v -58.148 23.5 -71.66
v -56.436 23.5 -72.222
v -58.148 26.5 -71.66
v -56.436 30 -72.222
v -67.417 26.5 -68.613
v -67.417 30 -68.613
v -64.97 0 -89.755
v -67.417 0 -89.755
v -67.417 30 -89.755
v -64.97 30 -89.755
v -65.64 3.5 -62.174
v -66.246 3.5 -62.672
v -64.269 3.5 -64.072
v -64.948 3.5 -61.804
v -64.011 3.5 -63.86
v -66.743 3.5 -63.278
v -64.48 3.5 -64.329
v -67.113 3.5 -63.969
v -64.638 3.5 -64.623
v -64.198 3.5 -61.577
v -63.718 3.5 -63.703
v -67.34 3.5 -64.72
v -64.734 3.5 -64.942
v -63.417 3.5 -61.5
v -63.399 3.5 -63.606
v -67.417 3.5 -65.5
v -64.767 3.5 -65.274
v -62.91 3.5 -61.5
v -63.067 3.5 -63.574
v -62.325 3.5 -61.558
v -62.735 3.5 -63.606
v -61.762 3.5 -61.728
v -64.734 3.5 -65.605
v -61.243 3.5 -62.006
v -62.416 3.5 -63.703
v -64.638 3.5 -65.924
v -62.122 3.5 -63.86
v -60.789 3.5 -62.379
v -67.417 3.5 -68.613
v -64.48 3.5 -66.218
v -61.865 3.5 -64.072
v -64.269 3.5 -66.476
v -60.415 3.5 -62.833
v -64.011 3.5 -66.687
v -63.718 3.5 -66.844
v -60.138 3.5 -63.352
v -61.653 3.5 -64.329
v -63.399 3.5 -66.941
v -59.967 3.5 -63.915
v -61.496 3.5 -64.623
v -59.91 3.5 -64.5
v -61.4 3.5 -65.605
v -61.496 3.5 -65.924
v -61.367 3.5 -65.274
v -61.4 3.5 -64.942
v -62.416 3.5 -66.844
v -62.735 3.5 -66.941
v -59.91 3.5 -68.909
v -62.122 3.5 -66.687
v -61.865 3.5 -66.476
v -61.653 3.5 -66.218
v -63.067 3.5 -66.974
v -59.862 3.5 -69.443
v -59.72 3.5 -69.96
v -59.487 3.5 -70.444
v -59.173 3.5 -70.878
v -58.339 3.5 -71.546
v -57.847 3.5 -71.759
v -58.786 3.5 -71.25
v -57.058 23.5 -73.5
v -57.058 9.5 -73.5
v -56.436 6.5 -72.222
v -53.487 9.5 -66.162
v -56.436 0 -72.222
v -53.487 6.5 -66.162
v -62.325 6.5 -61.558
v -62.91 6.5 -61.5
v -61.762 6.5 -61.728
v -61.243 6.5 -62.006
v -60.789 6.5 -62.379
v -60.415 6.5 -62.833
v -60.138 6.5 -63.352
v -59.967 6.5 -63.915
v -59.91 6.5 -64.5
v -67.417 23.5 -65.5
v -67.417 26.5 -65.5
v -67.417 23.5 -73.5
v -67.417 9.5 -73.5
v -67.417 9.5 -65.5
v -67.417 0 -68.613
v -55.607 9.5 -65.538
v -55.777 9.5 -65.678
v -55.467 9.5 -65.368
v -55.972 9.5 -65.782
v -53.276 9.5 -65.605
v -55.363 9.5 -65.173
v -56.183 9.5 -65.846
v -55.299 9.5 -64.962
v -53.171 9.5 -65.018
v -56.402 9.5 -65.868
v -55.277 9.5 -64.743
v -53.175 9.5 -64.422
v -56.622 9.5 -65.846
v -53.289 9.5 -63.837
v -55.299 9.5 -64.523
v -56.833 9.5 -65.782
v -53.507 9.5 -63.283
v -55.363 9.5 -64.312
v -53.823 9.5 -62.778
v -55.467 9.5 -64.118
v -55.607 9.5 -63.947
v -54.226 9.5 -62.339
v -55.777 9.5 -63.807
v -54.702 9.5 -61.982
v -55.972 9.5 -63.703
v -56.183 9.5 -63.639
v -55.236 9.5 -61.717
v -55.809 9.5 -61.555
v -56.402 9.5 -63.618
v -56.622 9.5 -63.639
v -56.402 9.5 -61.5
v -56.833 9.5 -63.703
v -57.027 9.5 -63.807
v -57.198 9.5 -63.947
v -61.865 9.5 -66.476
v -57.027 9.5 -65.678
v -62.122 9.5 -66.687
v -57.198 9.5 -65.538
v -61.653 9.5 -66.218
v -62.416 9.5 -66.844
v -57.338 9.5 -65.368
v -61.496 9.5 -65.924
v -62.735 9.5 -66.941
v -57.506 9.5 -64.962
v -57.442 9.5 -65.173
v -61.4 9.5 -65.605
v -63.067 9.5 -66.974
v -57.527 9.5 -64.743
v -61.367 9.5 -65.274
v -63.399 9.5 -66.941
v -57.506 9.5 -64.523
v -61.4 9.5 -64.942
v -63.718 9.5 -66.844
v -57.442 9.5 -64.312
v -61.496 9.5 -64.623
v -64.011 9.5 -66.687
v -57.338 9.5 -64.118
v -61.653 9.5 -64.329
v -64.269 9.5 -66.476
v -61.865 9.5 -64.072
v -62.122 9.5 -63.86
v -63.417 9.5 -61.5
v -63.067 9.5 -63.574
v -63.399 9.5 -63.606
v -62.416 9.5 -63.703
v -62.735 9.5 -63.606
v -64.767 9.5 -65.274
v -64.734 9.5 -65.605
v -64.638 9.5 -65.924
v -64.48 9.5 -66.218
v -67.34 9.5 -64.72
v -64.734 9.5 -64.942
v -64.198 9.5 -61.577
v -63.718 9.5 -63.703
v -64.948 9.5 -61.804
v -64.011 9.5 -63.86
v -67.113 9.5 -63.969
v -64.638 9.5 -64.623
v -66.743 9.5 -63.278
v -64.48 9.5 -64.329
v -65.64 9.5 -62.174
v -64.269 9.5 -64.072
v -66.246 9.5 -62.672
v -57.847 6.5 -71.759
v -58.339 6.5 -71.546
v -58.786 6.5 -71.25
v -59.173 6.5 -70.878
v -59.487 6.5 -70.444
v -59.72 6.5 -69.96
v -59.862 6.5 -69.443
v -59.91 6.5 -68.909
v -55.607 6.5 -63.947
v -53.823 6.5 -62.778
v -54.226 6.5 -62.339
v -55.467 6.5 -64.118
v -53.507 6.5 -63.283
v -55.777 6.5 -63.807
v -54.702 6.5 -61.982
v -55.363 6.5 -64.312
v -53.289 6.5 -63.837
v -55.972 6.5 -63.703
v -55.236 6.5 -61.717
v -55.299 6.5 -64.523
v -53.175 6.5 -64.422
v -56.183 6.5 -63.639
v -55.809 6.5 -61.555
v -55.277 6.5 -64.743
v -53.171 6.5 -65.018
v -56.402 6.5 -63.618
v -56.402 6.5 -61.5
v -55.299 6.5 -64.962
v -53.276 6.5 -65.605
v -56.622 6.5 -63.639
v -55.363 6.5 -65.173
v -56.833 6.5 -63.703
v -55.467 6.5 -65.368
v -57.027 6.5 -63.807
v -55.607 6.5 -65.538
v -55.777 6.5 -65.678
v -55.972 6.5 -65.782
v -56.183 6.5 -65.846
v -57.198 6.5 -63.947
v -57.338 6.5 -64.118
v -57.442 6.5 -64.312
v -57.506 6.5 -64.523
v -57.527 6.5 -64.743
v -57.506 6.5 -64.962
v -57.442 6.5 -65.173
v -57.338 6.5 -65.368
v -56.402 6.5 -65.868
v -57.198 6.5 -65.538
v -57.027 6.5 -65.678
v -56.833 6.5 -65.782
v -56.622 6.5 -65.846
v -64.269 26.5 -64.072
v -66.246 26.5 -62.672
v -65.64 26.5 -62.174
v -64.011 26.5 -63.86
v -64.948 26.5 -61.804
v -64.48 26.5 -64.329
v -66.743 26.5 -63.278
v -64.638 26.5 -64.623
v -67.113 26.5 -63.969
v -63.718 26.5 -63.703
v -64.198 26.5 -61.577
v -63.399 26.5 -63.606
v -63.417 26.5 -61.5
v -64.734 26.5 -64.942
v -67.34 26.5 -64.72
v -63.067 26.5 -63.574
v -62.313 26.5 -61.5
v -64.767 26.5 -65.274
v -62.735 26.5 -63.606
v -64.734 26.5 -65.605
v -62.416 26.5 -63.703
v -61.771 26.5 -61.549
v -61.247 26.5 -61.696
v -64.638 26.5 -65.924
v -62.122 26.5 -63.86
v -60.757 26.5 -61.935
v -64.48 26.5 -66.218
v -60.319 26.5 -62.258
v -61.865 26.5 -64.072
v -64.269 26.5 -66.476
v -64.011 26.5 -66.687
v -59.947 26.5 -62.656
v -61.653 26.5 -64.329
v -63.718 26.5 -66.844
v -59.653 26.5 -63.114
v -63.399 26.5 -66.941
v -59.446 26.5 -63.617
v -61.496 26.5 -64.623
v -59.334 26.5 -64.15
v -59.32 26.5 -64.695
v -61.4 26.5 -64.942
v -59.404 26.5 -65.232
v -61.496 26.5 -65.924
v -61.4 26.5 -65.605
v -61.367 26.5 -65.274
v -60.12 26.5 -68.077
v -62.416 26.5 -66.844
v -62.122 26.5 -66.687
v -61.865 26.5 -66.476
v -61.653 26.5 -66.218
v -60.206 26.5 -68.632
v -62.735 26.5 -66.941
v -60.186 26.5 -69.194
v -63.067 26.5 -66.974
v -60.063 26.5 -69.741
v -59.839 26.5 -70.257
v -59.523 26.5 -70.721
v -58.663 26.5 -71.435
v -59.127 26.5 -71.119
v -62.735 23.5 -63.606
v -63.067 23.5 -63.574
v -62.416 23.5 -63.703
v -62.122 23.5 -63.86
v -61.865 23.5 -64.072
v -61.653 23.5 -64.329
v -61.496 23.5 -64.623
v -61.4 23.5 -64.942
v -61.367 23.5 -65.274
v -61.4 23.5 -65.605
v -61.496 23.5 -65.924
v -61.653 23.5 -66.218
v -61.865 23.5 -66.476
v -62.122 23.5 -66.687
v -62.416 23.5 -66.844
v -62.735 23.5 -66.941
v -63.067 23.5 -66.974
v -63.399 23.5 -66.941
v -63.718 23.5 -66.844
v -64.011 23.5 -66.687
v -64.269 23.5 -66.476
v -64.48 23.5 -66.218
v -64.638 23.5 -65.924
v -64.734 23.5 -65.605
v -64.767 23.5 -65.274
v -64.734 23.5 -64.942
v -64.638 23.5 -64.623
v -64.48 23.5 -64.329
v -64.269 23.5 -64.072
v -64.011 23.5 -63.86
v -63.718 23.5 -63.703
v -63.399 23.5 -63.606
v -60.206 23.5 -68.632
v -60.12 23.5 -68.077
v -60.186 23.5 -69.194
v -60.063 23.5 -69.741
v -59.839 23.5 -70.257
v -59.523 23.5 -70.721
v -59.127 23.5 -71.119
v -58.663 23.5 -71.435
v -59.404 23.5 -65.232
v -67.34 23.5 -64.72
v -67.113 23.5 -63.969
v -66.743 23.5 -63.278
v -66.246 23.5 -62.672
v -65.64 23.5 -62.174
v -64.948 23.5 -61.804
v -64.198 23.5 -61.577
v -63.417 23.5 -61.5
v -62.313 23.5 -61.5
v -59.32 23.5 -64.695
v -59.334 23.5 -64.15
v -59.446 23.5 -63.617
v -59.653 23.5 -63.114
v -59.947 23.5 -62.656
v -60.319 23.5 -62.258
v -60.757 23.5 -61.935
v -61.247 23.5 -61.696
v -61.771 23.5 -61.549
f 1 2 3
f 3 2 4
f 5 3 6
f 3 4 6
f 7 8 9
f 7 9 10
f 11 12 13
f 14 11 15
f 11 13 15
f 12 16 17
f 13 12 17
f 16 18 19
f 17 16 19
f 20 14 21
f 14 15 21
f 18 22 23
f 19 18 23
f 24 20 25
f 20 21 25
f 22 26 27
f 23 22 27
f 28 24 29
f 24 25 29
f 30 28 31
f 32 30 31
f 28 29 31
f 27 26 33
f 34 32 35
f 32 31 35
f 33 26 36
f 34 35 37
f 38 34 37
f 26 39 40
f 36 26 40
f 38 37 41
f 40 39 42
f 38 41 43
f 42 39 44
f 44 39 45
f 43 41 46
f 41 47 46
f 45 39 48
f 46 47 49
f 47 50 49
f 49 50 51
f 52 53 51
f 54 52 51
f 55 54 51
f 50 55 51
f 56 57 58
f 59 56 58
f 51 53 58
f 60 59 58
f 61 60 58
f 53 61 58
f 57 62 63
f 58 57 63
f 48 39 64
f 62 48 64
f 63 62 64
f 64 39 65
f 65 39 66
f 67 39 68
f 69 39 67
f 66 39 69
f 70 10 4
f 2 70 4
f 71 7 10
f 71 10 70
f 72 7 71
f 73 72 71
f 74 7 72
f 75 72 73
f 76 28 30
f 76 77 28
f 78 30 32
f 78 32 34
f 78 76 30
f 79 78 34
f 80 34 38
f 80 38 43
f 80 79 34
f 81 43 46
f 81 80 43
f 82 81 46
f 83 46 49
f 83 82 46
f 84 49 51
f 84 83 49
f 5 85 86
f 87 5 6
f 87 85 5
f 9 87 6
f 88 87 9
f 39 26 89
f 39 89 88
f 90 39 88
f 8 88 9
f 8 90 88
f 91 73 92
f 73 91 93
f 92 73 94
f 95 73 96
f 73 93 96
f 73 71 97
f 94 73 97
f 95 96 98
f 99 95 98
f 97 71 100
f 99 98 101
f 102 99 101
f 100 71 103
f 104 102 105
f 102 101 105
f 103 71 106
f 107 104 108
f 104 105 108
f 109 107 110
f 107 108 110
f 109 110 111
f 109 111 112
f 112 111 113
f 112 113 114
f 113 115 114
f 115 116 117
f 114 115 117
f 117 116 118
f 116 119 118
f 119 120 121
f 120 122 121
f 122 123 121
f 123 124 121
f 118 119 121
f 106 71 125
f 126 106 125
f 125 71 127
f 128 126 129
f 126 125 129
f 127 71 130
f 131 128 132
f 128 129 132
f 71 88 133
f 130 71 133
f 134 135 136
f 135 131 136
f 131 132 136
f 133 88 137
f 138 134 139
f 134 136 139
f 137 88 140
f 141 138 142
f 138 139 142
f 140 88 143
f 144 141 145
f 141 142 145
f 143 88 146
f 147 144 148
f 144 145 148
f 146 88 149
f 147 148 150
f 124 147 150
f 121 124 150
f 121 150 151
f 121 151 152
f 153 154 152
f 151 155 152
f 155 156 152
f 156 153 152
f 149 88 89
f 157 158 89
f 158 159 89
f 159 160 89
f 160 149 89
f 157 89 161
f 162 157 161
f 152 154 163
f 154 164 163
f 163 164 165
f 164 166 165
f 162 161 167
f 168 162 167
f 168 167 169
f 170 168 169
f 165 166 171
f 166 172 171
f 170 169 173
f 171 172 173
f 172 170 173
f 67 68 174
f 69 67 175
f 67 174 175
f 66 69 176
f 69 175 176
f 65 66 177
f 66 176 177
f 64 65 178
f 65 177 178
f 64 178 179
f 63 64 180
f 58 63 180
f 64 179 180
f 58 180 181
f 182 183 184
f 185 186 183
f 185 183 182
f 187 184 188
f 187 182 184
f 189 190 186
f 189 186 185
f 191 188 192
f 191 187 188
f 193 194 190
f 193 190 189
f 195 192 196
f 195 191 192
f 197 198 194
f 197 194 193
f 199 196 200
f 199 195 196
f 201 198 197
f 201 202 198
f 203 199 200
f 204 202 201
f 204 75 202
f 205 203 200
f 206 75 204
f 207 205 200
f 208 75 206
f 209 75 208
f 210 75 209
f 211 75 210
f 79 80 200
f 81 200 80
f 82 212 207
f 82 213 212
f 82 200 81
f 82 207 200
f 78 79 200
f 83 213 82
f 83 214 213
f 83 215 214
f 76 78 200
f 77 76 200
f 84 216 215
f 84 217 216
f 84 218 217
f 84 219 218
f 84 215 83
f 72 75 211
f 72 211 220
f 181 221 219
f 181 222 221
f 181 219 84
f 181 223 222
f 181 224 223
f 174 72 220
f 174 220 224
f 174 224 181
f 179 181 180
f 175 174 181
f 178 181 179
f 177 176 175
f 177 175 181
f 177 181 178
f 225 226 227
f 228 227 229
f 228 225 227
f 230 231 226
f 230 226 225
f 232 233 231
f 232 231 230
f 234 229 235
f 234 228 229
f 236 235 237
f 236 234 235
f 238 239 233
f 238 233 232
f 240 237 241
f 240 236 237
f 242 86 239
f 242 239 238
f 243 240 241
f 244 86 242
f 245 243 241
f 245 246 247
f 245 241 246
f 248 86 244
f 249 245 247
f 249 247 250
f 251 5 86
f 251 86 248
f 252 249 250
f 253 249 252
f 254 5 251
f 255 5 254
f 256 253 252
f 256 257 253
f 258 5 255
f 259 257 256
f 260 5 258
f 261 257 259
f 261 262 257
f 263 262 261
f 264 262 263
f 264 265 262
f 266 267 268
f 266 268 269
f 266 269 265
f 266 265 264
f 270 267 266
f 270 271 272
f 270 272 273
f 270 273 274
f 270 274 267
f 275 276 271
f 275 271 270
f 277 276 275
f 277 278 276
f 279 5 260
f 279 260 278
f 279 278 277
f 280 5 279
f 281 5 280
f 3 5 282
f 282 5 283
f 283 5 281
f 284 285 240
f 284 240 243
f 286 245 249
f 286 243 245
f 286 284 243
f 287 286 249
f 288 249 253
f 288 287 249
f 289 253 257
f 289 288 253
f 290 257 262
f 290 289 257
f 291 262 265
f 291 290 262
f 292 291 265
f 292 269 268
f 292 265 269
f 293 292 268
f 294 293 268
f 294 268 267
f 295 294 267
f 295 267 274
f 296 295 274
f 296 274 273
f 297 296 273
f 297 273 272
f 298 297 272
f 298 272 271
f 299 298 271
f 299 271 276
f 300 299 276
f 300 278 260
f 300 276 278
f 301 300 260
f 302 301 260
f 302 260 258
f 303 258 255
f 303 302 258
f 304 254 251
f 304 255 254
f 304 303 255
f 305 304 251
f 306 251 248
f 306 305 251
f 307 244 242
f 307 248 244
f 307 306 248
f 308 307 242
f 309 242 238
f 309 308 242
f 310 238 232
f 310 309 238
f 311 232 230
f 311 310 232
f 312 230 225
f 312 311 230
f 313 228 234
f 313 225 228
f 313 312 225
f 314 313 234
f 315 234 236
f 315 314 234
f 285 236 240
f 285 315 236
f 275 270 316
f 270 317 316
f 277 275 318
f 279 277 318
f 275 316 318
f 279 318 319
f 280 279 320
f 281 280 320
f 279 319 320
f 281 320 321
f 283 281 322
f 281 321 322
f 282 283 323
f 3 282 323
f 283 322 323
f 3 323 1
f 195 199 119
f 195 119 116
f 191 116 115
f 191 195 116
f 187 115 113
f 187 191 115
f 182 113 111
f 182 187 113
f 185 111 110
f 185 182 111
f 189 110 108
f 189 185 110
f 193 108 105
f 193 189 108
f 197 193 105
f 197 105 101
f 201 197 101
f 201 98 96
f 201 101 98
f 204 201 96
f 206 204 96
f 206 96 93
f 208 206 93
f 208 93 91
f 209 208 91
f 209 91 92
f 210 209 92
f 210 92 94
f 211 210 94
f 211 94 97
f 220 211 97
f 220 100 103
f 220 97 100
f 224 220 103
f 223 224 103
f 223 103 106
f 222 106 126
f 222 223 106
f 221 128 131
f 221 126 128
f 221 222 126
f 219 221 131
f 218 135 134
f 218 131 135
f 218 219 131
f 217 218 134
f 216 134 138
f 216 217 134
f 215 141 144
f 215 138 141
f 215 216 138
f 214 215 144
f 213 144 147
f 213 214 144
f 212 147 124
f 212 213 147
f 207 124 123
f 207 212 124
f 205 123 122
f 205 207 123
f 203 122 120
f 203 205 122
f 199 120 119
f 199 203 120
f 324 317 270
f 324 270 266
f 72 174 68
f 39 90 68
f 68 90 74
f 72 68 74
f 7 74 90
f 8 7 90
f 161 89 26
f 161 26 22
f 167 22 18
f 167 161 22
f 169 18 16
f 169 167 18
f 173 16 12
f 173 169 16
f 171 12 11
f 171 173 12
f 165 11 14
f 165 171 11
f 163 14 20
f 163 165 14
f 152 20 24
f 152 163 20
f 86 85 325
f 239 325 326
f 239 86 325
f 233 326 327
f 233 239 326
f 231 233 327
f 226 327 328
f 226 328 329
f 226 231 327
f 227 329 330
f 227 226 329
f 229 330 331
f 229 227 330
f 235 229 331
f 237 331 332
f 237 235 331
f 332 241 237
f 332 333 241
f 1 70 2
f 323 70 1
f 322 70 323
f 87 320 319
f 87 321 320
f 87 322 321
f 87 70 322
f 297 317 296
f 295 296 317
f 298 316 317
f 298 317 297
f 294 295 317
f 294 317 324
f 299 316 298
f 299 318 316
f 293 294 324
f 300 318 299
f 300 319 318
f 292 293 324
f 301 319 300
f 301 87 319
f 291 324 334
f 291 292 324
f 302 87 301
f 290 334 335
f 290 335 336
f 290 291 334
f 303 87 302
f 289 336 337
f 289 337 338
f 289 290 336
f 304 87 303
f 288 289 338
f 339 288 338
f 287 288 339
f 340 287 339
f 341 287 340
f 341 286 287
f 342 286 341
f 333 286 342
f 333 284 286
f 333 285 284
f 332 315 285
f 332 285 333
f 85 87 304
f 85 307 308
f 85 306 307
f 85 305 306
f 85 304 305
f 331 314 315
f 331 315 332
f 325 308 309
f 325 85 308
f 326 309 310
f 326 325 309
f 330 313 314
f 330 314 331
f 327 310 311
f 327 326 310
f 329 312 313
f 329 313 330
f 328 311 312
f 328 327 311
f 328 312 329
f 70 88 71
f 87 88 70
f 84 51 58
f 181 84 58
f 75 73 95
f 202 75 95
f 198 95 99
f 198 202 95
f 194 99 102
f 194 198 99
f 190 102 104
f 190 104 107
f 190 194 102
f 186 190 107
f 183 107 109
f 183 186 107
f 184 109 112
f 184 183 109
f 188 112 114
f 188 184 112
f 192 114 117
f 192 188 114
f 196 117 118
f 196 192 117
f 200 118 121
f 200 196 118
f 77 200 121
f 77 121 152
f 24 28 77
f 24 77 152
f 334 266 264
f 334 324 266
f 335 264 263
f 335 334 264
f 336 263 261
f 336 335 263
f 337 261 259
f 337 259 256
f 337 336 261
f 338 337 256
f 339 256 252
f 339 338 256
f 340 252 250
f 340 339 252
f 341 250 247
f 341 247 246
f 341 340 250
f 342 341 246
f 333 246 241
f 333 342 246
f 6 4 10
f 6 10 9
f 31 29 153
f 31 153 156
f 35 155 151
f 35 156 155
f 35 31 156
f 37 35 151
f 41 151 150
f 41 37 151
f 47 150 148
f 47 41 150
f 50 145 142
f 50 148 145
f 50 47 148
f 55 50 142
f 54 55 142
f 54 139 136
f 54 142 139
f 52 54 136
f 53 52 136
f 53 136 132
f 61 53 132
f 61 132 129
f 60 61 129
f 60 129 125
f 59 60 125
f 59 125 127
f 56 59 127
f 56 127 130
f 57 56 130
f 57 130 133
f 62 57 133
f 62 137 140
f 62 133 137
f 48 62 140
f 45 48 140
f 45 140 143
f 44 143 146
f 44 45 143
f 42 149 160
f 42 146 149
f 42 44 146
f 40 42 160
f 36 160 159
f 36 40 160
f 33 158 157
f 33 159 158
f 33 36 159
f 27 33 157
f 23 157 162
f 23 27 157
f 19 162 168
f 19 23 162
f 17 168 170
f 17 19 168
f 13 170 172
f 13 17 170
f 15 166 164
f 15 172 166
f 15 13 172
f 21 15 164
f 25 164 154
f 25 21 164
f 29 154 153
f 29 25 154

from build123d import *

# Parameters (mm, degrees)
SKETCH1_R           = 1.7000000000000015
SKETCH1_R_2         = 1.1249999999999982
BOSS_EXTRUDE1_DEPTH = 30
CUT_EXTRUDE1_DEPTH  = 3.5
CUT_EXTRUDE2_DEPTH  = 3.5
FILLET1_R           = 4
SKETCH6_W           = 16.8927871134671
SKETCH6_H           = 14
CUT_EXTRUDE3_DEPTH  = 96.70345562354154
CUT_EXTRUDE4_DEPTH  = 3
FILLET2_R           = 3
FILLET3_R           = 3
CUT_EXTRUDE7_DEPTH  = 10
FILLET4_R           = 3
FILLET5_R           = 3


with BuildPart() as part:
    # Sketch1 → Boss-Extrude1 (new body)
    with BuildSketch(Plane(origin=(0, 0, 0), x_dir=(1, 0, 0), z_dir=(0, 1, 0))):
        with BuildLine():
            Line((-67.41726719036473, 89.75450030463905), (-64.96978375504433, 89.75450030463905))
            Line((-64.96978375504433, 89.75450030463905), (-53.48663897336089, 66.16198945077305))
            ThreePointArc((-53.48663897336089, 66.16198945077305), (-53.65304900524508, 63.02325116523408), (-56.40241603973214, 61.499981250381275))
            Line((-56.40241603973214, 61.499981250381275), (-67.41726719036473, 61.499981250381275))
            Line((-67.41726719036473, 61.499981250381275), (-67.41726719036473, 89.75450030463905))
        make_face()
        with Locations(Location((-63.06696708972735, 65.27360292976877, 0), (0, 0, 270))):
            Circle(SKETCH1_R, mode=Mode.SUBTRACT)
        with Locations(Location((-56.40241603973214, 64.74279797888421, 0), (0, 0, 270))):
            Circle(SKETCH1_R_2, mode=Mode.SUBTRACT)
    extrude(amount=BOSS_EXTRUDE1_DEPTH)

    # Sketch4 → Cut-Extrude1 (cut)
    with BuildSketch(Plane(origin=(0, 0, 0), x_dir=(-1, 0, 0), z_dir=(0, -1, 0))):
        Polygon((56.36085478477071, 72.24701778462617), (67.25774228220871, 68.66563773680312), (67.56486364186908, 68.5646989769961), (68.07491191484384, 60.66505530671413), (50.67511099214203, 61.303323516745735), (50.323559595932146, 66.74816258197976), align=None)
    extrude(amount=-CUT_EXTRUDE1_DEPTH, mode=Mode.SUBTRACT)

    # Sketch5 → Cut-Extrude2 (cut)
    with BuildSketch(Plane(origin=(0, 30, 0), x_dir=(1, 0, 0), z_dir=(0, 1, 0))):
        Polygon((-56.36085478477071, 72.24701778462617), (-67.25774228220871, 68.66563773680312), (-69.83403727288335, 67.81891049665515), (-69.83403727288335, 60.473378762572615), (-51.53143062922566, 60.473378762572615), (-50.58101521609465, 66.57187766349658), align=None)
    extrude(amount=-CUT_EXTRUDE2_DEPTH, mode=Mode.SUBTRACT)

    # Fillet1
    fillet1_edges = [part.edges().sort_by_distance(p)[0] for p in [
        (-67.41726719036473, 15, -61.499981250381275),
    ]]
    fillet(fillet1_edges, radius=FILLET1_R)

    # Sketch6 → Cut-Extrude3 (cut, through all)
    with BuildSketch(Plane.ZY.offset(67.41726719036473)):
        with Locations((-65.05358769364771, 16.5)):
            Rectangle(SKETCH6_W, SKETCH6_H)
    extrude(amount=-CUT_EXTRUDE3_DEPTH, mode=Mode.SUBTRACT)

    # Sketch7 → Cut-Extrude4 (cut)
    with BuildSketch(Plane(origin=(0, 3.5, 0), x_dir=(-1, 0, 0), z_dir=(0, -1, 0))):
        Polygon((56.43632253896984, 72.22221449018052), (53.48663897336088, 66.16198945077305), (50.72300756793861, 60.4840148917036), (56.40241603973214, 61.499981250381275), (59.909841615048435, 61.499981250381275), (59.909841615048435, 70.20099101348265), (59.909841615048435, 71.08060484084474), align=None)
    extrude(amount=-CUT_EXTRUDE4_DEPTH, mode=Mode.SUBTRACT)

    # Fillet2
    fillet2_edges = [part.edges().sort_by_distance(p)[0] for p in [
        (-59.909841615048435, 5, -61.499981250381275),
    ]]
    fillet(fillet2_edges, radius=FILLET2_R)

    # Fillet3
    fillet3_edges = [part.edges().sort_by_distance(p)[0] for p in [
        (-59.909841615048435, 5, -71.08060484084474),
    ]]
    fillet(fillet3_edges, radius=FILLET3_R)

    # Sketch8 → Cut-Extrude7 (cut)
    with BuildSketch(Plane(origin=(0, 26.5, 0), x_dir=(1, 0, 0), z_dir=(0, 1, 0))):
        Polygon((-59.61138736288163, 71.17869506194207), (-60.80258919639462, 70.78719368317894), (-58.46431809995156, 61.499981250381275), (-56.120645243524336, 59.6371858222966), (-50.85616204416965, 63.63562557653779), (-56.436322538969726, 72.22221449018029), align=None)
    extrude(amount=-CUT_EXTRUDE7_DEPTH, mode=Mode.SUBTRACT)

    # Fillet4
    fillet4_edges = [part.edges().sort_by_distance(p)[0] for p in [
        (-58.46431809995156, 25, -61.499981250381275),
    ]]
    fillet(fillet4_edges, radius=FILLET4_R)

    # Fillet5
    fillet5_edges = [part.edges().sort_by_distance(p)[0] for p in [
        (-60.80258919639462, 25, -70.78719368317894),
    ]]
    fillet(fillet5_edges, radius=FILLET5_R)


solid = part.part
